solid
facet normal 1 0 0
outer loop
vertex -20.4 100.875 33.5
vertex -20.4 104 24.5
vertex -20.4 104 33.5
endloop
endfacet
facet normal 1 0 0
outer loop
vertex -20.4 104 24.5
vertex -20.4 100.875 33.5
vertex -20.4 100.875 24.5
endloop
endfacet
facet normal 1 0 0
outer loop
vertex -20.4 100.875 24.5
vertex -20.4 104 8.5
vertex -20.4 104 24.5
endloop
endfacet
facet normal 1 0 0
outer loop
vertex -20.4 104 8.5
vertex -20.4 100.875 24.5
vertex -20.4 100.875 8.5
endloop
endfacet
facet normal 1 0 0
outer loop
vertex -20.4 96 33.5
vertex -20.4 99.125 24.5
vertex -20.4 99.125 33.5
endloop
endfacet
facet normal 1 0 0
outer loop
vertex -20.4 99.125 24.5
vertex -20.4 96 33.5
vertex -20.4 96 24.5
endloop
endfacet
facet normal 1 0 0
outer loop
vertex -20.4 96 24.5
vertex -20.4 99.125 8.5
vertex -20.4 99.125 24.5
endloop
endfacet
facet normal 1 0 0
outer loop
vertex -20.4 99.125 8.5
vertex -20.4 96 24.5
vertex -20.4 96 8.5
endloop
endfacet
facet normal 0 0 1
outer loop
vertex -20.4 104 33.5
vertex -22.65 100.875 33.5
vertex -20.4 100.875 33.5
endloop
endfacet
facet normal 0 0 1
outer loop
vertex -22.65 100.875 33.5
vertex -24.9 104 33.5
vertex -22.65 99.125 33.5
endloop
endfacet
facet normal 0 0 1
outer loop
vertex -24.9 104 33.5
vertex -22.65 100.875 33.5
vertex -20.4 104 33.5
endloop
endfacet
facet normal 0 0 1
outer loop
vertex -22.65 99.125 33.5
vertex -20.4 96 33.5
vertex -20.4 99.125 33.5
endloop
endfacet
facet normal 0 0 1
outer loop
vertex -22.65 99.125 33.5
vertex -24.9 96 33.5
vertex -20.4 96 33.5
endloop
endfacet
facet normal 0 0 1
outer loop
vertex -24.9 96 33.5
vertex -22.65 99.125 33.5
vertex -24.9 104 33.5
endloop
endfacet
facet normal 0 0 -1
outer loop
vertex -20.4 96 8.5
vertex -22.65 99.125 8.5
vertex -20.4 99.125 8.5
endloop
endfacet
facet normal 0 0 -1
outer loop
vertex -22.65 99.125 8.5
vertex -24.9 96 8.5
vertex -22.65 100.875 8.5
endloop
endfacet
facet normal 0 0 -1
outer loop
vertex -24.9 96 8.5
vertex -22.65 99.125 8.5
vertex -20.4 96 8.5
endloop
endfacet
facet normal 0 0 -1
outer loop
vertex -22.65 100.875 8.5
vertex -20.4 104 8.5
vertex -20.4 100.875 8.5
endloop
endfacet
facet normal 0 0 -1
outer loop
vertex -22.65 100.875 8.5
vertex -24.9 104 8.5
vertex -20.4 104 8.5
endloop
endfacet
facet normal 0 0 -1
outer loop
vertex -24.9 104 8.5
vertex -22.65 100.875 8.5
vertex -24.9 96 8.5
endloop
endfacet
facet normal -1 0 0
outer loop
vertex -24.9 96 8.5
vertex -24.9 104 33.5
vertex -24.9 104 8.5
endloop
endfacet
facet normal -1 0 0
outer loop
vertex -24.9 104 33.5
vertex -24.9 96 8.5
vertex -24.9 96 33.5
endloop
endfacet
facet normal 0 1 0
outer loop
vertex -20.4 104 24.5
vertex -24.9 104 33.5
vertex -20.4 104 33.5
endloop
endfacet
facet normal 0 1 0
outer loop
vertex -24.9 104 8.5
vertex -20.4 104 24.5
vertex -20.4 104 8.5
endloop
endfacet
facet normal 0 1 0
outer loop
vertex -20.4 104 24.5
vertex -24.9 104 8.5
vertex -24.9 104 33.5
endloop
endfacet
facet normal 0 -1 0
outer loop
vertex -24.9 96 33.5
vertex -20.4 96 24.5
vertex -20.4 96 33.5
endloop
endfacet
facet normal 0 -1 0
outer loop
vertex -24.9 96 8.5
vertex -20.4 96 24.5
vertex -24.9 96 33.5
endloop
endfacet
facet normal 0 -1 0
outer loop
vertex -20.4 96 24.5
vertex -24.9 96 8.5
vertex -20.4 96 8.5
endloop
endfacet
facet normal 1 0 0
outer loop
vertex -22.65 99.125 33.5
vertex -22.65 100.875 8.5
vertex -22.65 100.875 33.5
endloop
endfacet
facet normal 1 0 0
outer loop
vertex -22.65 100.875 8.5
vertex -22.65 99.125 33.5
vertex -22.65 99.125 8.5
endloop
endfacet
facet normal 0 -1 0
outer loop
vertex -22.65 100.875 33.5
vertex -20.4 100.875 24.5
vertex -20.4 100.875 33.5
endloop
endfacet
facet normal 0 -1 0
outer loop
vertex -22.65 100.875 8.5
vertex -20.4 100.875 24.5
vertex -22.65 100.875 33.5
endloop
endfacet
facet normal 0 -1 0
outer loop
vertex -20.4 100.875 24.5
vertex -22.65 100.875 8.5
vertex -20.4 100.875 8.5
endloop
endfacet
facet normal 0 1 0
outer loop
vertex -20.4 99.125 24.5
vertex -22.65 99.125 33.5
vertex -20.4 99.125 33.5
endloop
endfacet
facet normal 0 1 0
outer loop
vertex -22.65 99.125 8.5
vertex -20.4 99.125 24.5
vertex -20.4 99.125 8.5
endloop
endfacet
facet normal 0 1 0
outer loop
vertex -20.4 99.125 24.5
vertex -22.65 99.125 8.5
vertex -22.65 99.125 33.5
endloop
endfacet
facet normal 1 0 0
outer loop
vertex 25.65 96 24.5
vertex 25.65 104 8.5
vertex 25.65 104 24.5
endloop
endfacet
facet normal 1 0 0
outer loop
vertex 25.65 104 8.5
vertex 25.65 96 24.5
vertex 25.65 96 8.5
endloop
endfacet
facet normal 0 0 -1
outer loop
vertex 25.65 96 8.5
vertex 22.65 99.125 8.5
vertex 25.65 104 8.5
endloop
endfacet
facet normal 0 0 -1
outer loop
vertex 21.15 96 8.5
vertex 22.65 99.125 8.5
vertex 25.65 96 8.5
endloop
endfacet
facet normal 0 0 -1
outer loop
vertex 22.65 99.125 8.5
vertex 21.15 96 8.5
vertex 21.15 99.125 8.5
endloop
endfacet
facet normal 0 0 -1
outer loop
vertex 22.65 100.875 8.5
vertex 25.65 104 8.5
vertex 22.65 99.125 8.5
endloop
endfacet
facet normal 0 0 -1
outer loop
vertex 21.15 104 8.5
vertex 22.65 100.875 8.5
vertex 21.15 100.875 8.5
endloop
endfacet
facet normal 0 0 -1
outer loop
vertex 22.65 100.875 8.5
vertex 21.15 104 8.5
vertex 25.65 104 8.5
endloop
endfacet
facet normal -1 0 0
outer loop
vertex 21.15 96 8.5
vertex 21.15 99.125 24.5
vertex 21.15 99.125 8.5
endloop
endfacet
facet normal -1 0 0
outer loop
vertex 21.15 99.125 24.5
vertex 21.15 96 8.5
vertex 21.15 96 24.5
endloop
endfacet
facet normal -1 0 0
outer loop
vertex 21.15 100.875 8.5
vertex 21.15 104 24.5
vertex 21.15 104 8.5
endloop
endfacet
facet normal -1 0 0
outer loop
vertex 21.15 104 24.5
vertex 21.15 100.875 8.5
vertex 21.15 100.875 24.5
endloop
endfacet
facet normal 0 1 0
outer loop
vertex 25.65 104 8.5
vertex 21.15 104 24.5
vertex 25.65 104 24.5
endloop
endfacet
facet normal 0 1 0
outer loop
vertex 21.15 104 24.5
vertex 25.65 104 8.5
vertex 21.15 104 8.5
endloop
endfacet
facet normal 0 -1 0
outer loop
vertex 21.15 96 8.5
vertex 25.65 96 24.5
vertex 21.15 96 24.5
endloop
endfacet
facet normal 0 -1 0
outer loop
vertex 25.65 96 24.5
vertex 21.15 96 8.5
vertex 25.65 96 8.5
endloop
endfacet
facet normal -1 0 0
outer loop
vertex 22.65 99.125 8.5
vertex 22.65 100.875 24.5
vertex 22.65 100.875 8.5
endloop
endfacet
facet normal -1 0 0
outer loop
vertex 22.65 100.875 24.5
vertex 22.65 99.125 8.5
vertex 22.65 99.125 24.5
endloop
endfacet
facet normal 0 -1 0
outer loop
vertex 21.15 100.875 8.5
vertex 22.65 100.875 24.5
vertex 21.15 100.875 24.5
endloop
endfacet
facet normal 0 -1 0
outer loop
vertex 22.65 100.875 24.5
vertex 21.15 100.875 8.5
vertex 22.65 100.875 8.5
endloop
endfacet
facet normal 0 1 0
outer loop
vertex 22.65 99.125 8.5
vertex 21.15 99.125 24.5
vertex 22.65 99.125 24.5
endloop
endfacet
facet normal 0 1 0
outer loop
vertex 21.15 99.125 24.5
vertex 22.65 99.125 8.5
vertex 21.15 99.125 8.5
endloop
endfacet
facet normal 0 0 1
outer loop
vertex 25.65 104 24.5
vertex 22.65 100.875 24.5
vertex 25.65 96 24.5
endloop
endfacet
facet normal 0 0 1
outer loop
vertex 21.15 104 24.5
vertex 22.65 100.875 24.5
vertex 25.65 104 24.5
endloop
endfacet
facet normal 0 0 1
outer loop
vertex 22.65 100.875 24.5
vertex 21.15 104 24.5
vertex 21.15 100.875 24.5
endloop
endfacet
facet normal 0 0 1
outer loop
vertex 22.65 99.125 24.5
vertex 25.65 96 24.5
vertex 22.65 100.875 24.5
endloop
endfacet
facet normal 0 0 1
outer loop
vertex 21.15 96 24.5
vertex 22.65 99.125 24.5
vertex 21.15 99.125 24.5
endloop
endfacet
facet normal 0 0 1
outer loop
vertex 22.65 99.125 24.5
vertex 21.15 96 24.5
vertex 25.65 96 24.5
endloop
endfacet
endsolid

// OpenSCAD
$fa = 1; $fs = $preview ? 0.5 : 0.5;
$fn = $preview? 200 : 200;

$ellipse_length = 106;
$ellipse_width = 56;
$base_height = 8.5;
$casing_straight_height = 80;
$casing_roof_height = 20;
$screw_thickness = 2;
$board_width = 45.3;
$board_thickness = 1.75;
$rail_height = 25;
$rail_width = 4.5;
$rail_length = 8;
$ellipse_inner_width = $ellipse_width-2.5;
$cutout_square_width = $board_width-1.5;

$angular_cutaway_start = $base_height-2+7;
$angular_cutaway_end = $rail_height;
module elrdcyl(
   w, // width of cylinder
   d, // depth of cylinder
   h1,// straight height of cylinder
   h2 // height of rounded top
   ) {
   intersection(){
     union(){
       scale([w/2,d/2,1])cylinder(r=1,h=h1);  // cylinder
       translate([0,0,h1])scale([w/2,d/2,h2])sphere(r=1);  // top
     }
     scale([w/2,d/2,1])cylinder(r=1,h=h1+h2); // only needed if h2>h1 
   }
}
module cover_main() {
elrdcyl($ellipse_length,$ellipse_width,$casing_straight_height,$casing_roof_height);
}

$notch_height = 20;
$notch_width = 12;
$notch_start = $casing_straight_height+$casing_roof_height-3;
$through_hole = 2.8;
//$notch_start = 0;
$pitch = 5;
$screw_height = 13;
$screw_width = 10;
$screwtop_height = 8;
$screwtop_radius = 6;



$cutout_insert_width = 3;
                
$battery_to_rail_distance = 0;
$battery_cutout_cylinder_width = 2;
$cutout_insert_length = ($ellipse_inner_width/2)-$screw_thickness;


    difference() {
         translate([-($board_width+$rail_width)/2, 100-$rail_length/2, $base_height]) cube([$rail_width, $rail_length, $rail_height]);
         translate([-$board_width/2, 100-$board_thickness/2, $base_height-2]) cube([$board_width, $board_thickness, $rail_height+15]);
         translate([$rail_width, 100, $rail_height+24.5]) cube([$board_width+$rail_width, $rail_length, $rail_height+25], true);
     }
    difference() {
         translate([($board_width)/2-1.5, 100-$rail_length/2, $base_height]) cube([$rail_width, $rail_length, $rail_height]);
         translate([-$board_width/2, 100-$board_thickness/2, $base_height-2]) cube([$board_width, $board_thickness, $rail_height+15]);
         translate([$rail_width, 100, $rail_height+24.5]) cube([$board_width+$rail_width, $rail_length, $rail_height+25], true);
     }
